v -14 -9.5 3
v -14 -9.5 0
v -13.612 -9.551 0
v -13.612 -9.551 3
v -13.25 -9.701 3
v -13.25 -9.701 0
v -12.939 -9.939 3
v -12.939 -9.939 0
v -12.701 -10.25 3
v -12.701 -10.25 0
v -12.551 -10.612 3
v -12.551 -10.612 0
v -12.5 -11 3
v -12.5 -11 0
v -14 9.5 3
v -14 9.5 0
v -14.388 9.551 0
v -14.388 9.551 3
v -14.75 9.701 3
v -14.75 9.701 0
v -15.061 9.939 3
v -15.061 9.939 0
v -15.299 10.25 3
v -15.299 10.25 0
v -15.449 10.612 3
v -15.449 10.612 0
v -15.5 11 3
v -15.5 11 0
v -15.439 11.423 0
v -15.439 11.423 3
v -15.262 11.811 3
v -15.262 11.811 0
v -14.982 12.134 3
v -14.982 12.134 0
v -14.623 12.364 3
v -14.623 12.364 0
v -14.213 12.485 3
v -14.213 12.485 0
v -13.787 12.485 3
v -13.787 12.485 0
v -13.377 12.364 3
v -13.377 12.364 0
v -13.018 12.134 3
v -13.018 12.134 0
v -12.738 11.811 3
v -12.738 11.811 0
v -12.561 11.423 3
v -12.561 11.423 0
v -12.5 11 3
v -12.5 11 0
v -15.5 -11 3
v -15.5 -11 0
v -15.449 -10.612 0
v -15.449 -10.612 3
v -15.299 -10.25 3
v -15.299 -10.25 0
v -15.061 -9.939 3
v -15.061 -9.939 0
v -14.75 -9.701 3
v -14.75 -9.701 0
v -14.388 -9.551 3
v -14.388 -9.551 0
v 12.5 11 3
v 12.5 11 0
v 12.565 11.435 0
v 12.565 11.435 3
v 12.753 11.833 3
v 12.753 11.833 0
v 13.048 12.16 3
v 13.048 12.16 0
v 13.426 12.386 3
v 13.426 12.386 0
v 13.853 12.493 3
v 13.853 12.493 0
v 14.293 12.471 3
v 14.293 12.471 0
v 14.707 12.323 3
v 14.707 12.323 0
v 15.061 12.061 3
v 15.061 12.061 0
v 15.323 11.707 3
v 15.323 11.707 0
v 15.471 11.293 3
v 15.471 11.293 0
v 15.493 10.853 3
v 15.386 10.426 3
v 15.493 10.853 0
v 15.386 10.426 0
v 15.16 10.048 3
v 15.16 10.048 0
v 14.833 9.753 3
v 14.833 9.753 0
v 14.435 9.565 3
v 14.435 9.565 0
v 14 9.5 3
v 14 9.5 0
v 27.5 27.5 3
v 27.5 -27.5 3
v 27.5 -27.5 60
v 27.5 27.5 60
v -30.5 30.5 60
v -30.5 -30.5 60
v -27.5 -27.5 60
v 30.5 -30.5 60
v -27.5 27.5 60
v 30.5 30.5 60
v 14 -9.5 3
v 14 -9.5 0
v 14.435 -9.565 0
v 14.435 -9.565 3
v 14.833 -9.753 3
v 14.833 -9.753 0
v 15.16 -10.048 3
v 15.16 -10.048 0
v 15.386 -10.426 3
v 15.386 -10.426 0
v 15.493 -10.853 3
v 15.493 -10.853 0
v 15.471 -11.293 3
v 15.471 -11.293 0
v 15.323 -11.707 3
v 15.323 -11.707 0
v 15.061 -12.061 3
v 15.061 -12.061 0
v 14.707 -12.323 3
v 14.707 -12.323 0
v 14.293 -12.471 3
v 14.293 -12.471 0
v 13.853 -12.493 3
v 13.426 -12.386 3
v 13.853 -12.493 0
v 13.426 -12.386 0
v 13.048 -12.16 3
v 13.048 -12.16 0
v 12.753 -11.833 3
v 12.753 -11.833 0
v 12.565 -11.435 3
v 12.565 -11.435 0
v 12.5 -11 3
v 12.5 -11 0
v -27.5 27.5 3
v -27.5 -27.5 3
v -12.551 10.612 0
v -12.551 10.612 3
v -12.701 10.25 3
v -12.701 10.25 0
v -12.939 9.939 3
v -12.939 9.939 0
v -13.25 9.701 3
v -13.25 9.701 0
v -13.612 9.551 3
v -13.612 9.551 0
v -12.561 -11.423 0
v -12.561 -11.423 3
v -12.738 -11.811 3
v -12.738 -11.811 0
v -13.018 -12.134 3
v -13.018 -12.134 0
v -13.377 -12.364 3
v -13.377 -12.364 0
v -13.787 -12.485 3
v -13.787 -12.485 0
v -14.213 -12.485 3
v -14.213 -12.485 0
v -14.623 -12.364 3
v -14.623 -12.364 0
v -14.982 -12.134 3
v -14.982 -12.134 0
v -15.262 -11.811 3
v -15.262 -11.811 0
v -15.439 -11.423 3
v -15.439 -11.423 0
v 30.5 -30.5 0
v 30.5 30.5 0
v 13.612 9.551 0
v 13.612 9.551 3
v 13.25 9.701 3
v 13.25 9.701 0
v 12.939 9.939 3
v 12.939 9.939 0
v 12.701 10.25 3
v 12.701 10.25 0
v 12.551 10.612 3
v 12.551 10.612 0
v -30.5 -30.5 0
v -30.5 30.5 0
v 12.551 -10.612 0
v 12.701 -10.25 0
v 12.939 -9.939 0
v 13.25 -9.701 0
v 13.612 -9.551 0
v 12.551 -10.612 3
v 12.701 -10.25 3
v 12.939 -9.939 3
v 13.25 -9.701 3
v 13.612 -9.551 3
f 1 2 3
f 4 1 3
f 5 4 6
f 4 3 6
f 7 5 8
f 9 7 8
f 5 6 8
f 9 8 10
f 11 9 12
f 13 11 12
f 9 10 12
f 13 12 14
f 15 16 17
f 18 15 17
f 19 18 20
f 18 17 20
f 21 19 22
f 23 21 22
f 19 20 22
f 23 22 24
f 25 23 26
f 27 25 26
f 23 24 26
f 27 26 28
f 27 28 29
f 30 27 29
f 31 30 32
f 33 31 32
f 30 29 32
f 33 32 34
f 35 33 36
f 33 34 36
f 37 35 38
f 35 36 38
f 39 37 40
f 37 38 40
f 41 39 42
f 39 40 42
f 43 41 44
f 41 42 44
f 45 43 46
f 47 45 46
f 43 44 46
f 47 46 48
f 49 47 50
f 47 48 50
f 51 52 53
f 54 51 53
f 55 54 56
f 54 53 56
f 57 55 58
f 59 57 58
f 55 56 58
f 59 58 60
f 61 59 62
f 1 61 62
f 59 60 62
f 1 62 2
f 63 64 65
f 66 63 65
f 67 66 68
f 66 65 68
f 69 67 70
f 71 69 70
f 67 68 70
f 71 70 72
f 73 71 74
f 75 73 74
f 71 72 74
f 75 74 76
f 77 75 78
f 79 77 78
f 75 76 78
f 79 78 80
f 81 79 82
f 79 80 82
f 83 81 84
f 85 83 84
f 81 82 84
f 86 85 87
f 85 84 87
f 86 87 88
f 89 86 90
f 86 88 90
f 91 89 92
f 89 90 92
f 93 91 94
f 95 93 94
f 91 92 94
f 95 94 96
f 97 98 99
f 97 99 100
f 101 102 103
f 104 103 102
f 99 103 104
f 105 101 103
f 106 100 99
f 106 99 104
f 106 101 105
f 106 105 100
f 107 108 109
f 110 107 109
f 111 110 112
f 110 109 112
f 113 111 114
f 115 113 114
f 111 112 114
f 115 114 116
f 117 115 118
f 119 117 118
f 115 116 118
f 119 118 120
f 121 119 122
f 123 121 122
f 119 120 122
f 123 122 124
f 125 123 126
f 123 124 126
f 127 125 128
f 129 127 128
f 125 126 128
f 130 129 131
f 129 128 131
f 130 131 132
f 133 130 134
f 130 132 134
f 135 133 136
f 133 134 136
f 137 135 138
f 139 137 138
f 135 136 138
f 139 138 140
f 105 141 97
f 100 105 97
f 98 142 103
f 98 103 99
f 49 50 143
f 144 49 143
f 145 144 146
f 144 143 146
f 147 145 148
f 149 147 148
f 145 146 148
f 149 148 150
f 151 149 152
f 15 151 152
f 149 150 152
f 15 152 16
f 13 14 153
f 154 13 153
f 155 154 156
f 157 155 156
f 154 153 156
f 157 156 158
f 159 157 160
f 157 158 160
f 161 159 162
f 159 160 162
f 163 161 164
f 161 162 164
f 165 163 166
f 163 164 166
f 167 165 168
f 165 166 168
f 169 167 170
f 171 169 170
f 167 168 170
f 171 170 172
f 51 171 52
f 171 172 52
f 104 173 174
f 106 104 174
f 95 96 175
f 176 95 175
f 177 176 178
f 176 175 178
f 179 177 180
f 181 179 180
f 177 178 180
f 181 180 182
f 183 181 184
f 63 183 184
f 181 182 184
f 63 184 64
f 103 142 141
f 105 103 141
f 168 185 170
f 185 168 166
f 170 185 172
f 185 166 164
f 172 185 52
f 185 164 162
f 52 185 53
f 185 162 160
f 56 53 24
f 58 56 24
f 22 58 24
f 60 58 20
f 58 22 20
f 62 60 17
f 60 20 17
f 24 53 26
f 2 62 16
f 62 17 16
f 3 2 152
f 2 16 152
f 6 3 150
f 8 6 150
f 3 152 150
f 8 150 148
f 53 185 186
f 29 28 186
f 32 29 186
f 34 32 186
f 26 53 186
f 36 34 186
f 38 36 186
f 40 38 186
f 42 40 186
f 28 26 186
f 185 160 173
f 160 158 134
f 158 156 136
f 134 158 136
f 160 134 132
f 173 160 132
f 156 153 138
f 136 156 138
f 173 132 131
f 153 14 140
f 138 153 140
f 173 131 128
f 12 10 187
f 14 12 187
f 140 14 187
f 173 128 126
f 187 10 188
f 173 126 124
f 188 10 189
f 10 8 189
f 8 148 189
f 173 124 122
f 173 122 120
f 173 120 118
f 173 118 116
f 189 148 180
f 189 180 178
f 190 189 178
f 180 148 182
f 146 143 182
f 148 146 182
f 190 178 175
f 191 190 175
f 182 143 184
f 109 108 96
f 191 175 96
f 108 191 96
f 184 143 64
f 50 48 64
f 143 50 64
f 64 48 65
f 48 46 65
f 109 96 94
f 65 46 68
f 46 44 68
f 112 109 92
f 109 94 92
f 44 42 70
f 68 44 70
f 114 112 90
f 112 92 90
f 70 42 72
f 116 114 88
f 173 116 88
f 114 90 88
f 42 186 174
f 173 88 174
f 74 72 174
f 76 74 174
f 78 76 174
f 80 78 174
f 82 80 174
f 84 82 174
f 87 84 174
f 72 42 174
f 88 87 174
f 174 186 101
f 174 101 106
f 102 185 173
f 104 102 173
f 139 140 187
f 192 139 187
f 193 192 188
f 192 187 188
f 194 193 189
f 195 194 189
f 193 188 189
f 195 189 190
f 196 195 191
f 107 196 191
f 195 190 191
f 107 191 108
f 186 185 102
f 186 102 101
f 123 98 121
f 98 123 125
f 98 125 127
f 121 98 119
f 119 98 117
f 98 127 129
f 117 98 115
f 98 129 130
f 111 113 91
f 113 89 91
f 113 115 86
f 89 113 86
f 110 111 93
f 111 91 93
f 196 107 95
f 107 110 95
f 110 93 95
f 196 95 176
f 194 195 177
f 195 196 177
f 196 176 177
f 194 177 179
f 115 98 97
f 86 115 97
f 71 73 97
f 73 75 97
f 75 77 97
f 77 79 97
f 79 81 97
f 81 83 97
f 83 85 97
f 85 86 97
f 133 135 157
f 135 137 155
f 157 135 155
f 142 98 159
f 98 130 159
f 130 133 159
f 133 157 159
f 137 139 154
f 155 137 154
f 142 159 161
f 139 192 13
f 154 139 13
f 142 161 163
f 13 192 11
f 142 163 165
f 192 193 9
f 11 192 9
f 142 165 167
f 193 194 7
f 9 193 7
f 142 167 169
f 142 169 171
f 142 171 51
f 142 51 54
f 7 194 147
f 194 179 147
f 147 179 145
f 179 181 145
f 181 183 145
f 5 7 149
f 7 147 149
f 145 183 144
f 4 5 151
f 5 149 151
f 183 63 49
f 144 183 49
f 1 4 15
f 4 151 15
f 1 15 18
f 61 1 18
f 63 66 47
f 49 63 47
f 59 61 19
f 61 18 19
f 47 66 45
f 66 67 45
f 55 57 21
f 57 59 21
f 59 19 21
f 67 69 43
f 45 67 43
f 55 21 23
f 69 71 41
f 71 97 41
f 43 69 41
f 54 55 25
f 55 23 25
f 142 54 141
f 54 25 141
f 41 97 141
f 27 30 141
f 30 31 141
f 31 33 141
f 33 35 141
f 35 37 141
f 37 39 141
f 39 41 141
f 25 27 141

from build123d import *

# Parameters (mm, degrees)
SKETCH1_W           = 61
SKETCH1_H           = 61
SKETCH1_W_2         = 55
SKETCH1_H_2         = 55
BOSS_EXTRUDE1_DEPTH = 60
SKETCH2_W           = 61
SKETCH2_H           = 61
BOSS_EXTRUDE2_DEPTH = 3
CUT_EXTRUDE1_DEPTH  = 3


with BuildPart() as part:
    # Sketch1 → Boss-Extrude1 (new body)
    with BuildSketch(Plane.XY):
        Rectangle(SKETCH1_W, SKETCH1_H)
        Rectangle(SKETCH1_W_2, SKETCH1_H_2, mode=Mode.SUBTRACT)
    extrude(amount=BOSS_EXTRUDE1_DEPTH)

    # Sketch2 → Boss-Extrude2 (add)
    with BuildSketch(Plane(origin=(0, 0, 0), x_dir=(-1, 0, 0), z_dir=(0, 0, -1))):
        Rectangle(SKETCH2_W, SKETCH2_H)
    extrude(amount=-BOSS_EXTRUDE2_DEPTH)

    # Sketch3 → Cut-Extrude1 (cut)
    with BuildSketch(Plane(origin=(0, 0, 0), x_dir=(-1, 0, 0), z_dir=(0, 0, -1))):
        with BuildLine():
            ThreePointArc((14, -9.5), (12.939339828, -9.939339828), (12.5, -11))
            Line((12.5, -11), (14, -11))
            Line((14, -11), (14, -9.5))
        make_face()
        with BuildLine():
            Line((14, -11), (12.5, -11))
            ThreePointArc((12.5, -11), (14, -12.5), (15.5, -11))
            ThreePointArc((15.5, -11), (15.060660172, -9.939339828), (14, -9.5))
            Line((14, -9.5), (14, -11))
        make_face()
        with BuildLine():
            Line((-14, -9.5), (-14, -11))
            Line((-14, -11), (-12.5, -11))
            ThreePointArc((-12.5, -11), (-12.939339828, -9.939339828), (-14, -9.5))
        make_face()
        with BuildLine():
            Line((-12.5, -11), (-14, -11))
            Line((-14, -11), (-14, -9.5))
            ThreePointArc((-14, -9.5), (-15.060660172, -12.060660172), (-12.5, -11))
        make_face()
        with BuildLine():
            ThreePointArc((12.5, 11), (12.939339828, 9.939339828), (14, 9.5))
            Line((14, 9.5), (14, 11))
            Line((14, 11), (12.5, 11))
        make_face()
        with BuildLine():
            Line((14, 11), (14, 9.5))
            ThreePointArc((14, 9.5), (15.060660172, 9.939339828), (15.5, 11))
            ThreePointArc((15.5, 11), (14, 12.5), (12.5, 11))
            Line((12.5, 11), (14, 11))
        make_face()
        with BuildLine():
            ThreePointArc((-12.5, 11), (-15.060660172, 12.060660172), (-14, 9.5))
            Line((-14, 9.5), (-14, 11))
            Line((-14, 11), (-12.5, 11))
        make_face()
        with BuildLine():
            Line((-14, 11), (-14, 9.5))
            ThreePointArc((-14, 9.5), (-12.939339828, 9.939339828), (-12.5, 11))
            Line((-12.5, 11), (-14, 11))
        make_face()
    extrude(amount=-CUT_EXTRUDE1_DEPTH, mode=Mode.SUBTRACT)


solid = part.part
